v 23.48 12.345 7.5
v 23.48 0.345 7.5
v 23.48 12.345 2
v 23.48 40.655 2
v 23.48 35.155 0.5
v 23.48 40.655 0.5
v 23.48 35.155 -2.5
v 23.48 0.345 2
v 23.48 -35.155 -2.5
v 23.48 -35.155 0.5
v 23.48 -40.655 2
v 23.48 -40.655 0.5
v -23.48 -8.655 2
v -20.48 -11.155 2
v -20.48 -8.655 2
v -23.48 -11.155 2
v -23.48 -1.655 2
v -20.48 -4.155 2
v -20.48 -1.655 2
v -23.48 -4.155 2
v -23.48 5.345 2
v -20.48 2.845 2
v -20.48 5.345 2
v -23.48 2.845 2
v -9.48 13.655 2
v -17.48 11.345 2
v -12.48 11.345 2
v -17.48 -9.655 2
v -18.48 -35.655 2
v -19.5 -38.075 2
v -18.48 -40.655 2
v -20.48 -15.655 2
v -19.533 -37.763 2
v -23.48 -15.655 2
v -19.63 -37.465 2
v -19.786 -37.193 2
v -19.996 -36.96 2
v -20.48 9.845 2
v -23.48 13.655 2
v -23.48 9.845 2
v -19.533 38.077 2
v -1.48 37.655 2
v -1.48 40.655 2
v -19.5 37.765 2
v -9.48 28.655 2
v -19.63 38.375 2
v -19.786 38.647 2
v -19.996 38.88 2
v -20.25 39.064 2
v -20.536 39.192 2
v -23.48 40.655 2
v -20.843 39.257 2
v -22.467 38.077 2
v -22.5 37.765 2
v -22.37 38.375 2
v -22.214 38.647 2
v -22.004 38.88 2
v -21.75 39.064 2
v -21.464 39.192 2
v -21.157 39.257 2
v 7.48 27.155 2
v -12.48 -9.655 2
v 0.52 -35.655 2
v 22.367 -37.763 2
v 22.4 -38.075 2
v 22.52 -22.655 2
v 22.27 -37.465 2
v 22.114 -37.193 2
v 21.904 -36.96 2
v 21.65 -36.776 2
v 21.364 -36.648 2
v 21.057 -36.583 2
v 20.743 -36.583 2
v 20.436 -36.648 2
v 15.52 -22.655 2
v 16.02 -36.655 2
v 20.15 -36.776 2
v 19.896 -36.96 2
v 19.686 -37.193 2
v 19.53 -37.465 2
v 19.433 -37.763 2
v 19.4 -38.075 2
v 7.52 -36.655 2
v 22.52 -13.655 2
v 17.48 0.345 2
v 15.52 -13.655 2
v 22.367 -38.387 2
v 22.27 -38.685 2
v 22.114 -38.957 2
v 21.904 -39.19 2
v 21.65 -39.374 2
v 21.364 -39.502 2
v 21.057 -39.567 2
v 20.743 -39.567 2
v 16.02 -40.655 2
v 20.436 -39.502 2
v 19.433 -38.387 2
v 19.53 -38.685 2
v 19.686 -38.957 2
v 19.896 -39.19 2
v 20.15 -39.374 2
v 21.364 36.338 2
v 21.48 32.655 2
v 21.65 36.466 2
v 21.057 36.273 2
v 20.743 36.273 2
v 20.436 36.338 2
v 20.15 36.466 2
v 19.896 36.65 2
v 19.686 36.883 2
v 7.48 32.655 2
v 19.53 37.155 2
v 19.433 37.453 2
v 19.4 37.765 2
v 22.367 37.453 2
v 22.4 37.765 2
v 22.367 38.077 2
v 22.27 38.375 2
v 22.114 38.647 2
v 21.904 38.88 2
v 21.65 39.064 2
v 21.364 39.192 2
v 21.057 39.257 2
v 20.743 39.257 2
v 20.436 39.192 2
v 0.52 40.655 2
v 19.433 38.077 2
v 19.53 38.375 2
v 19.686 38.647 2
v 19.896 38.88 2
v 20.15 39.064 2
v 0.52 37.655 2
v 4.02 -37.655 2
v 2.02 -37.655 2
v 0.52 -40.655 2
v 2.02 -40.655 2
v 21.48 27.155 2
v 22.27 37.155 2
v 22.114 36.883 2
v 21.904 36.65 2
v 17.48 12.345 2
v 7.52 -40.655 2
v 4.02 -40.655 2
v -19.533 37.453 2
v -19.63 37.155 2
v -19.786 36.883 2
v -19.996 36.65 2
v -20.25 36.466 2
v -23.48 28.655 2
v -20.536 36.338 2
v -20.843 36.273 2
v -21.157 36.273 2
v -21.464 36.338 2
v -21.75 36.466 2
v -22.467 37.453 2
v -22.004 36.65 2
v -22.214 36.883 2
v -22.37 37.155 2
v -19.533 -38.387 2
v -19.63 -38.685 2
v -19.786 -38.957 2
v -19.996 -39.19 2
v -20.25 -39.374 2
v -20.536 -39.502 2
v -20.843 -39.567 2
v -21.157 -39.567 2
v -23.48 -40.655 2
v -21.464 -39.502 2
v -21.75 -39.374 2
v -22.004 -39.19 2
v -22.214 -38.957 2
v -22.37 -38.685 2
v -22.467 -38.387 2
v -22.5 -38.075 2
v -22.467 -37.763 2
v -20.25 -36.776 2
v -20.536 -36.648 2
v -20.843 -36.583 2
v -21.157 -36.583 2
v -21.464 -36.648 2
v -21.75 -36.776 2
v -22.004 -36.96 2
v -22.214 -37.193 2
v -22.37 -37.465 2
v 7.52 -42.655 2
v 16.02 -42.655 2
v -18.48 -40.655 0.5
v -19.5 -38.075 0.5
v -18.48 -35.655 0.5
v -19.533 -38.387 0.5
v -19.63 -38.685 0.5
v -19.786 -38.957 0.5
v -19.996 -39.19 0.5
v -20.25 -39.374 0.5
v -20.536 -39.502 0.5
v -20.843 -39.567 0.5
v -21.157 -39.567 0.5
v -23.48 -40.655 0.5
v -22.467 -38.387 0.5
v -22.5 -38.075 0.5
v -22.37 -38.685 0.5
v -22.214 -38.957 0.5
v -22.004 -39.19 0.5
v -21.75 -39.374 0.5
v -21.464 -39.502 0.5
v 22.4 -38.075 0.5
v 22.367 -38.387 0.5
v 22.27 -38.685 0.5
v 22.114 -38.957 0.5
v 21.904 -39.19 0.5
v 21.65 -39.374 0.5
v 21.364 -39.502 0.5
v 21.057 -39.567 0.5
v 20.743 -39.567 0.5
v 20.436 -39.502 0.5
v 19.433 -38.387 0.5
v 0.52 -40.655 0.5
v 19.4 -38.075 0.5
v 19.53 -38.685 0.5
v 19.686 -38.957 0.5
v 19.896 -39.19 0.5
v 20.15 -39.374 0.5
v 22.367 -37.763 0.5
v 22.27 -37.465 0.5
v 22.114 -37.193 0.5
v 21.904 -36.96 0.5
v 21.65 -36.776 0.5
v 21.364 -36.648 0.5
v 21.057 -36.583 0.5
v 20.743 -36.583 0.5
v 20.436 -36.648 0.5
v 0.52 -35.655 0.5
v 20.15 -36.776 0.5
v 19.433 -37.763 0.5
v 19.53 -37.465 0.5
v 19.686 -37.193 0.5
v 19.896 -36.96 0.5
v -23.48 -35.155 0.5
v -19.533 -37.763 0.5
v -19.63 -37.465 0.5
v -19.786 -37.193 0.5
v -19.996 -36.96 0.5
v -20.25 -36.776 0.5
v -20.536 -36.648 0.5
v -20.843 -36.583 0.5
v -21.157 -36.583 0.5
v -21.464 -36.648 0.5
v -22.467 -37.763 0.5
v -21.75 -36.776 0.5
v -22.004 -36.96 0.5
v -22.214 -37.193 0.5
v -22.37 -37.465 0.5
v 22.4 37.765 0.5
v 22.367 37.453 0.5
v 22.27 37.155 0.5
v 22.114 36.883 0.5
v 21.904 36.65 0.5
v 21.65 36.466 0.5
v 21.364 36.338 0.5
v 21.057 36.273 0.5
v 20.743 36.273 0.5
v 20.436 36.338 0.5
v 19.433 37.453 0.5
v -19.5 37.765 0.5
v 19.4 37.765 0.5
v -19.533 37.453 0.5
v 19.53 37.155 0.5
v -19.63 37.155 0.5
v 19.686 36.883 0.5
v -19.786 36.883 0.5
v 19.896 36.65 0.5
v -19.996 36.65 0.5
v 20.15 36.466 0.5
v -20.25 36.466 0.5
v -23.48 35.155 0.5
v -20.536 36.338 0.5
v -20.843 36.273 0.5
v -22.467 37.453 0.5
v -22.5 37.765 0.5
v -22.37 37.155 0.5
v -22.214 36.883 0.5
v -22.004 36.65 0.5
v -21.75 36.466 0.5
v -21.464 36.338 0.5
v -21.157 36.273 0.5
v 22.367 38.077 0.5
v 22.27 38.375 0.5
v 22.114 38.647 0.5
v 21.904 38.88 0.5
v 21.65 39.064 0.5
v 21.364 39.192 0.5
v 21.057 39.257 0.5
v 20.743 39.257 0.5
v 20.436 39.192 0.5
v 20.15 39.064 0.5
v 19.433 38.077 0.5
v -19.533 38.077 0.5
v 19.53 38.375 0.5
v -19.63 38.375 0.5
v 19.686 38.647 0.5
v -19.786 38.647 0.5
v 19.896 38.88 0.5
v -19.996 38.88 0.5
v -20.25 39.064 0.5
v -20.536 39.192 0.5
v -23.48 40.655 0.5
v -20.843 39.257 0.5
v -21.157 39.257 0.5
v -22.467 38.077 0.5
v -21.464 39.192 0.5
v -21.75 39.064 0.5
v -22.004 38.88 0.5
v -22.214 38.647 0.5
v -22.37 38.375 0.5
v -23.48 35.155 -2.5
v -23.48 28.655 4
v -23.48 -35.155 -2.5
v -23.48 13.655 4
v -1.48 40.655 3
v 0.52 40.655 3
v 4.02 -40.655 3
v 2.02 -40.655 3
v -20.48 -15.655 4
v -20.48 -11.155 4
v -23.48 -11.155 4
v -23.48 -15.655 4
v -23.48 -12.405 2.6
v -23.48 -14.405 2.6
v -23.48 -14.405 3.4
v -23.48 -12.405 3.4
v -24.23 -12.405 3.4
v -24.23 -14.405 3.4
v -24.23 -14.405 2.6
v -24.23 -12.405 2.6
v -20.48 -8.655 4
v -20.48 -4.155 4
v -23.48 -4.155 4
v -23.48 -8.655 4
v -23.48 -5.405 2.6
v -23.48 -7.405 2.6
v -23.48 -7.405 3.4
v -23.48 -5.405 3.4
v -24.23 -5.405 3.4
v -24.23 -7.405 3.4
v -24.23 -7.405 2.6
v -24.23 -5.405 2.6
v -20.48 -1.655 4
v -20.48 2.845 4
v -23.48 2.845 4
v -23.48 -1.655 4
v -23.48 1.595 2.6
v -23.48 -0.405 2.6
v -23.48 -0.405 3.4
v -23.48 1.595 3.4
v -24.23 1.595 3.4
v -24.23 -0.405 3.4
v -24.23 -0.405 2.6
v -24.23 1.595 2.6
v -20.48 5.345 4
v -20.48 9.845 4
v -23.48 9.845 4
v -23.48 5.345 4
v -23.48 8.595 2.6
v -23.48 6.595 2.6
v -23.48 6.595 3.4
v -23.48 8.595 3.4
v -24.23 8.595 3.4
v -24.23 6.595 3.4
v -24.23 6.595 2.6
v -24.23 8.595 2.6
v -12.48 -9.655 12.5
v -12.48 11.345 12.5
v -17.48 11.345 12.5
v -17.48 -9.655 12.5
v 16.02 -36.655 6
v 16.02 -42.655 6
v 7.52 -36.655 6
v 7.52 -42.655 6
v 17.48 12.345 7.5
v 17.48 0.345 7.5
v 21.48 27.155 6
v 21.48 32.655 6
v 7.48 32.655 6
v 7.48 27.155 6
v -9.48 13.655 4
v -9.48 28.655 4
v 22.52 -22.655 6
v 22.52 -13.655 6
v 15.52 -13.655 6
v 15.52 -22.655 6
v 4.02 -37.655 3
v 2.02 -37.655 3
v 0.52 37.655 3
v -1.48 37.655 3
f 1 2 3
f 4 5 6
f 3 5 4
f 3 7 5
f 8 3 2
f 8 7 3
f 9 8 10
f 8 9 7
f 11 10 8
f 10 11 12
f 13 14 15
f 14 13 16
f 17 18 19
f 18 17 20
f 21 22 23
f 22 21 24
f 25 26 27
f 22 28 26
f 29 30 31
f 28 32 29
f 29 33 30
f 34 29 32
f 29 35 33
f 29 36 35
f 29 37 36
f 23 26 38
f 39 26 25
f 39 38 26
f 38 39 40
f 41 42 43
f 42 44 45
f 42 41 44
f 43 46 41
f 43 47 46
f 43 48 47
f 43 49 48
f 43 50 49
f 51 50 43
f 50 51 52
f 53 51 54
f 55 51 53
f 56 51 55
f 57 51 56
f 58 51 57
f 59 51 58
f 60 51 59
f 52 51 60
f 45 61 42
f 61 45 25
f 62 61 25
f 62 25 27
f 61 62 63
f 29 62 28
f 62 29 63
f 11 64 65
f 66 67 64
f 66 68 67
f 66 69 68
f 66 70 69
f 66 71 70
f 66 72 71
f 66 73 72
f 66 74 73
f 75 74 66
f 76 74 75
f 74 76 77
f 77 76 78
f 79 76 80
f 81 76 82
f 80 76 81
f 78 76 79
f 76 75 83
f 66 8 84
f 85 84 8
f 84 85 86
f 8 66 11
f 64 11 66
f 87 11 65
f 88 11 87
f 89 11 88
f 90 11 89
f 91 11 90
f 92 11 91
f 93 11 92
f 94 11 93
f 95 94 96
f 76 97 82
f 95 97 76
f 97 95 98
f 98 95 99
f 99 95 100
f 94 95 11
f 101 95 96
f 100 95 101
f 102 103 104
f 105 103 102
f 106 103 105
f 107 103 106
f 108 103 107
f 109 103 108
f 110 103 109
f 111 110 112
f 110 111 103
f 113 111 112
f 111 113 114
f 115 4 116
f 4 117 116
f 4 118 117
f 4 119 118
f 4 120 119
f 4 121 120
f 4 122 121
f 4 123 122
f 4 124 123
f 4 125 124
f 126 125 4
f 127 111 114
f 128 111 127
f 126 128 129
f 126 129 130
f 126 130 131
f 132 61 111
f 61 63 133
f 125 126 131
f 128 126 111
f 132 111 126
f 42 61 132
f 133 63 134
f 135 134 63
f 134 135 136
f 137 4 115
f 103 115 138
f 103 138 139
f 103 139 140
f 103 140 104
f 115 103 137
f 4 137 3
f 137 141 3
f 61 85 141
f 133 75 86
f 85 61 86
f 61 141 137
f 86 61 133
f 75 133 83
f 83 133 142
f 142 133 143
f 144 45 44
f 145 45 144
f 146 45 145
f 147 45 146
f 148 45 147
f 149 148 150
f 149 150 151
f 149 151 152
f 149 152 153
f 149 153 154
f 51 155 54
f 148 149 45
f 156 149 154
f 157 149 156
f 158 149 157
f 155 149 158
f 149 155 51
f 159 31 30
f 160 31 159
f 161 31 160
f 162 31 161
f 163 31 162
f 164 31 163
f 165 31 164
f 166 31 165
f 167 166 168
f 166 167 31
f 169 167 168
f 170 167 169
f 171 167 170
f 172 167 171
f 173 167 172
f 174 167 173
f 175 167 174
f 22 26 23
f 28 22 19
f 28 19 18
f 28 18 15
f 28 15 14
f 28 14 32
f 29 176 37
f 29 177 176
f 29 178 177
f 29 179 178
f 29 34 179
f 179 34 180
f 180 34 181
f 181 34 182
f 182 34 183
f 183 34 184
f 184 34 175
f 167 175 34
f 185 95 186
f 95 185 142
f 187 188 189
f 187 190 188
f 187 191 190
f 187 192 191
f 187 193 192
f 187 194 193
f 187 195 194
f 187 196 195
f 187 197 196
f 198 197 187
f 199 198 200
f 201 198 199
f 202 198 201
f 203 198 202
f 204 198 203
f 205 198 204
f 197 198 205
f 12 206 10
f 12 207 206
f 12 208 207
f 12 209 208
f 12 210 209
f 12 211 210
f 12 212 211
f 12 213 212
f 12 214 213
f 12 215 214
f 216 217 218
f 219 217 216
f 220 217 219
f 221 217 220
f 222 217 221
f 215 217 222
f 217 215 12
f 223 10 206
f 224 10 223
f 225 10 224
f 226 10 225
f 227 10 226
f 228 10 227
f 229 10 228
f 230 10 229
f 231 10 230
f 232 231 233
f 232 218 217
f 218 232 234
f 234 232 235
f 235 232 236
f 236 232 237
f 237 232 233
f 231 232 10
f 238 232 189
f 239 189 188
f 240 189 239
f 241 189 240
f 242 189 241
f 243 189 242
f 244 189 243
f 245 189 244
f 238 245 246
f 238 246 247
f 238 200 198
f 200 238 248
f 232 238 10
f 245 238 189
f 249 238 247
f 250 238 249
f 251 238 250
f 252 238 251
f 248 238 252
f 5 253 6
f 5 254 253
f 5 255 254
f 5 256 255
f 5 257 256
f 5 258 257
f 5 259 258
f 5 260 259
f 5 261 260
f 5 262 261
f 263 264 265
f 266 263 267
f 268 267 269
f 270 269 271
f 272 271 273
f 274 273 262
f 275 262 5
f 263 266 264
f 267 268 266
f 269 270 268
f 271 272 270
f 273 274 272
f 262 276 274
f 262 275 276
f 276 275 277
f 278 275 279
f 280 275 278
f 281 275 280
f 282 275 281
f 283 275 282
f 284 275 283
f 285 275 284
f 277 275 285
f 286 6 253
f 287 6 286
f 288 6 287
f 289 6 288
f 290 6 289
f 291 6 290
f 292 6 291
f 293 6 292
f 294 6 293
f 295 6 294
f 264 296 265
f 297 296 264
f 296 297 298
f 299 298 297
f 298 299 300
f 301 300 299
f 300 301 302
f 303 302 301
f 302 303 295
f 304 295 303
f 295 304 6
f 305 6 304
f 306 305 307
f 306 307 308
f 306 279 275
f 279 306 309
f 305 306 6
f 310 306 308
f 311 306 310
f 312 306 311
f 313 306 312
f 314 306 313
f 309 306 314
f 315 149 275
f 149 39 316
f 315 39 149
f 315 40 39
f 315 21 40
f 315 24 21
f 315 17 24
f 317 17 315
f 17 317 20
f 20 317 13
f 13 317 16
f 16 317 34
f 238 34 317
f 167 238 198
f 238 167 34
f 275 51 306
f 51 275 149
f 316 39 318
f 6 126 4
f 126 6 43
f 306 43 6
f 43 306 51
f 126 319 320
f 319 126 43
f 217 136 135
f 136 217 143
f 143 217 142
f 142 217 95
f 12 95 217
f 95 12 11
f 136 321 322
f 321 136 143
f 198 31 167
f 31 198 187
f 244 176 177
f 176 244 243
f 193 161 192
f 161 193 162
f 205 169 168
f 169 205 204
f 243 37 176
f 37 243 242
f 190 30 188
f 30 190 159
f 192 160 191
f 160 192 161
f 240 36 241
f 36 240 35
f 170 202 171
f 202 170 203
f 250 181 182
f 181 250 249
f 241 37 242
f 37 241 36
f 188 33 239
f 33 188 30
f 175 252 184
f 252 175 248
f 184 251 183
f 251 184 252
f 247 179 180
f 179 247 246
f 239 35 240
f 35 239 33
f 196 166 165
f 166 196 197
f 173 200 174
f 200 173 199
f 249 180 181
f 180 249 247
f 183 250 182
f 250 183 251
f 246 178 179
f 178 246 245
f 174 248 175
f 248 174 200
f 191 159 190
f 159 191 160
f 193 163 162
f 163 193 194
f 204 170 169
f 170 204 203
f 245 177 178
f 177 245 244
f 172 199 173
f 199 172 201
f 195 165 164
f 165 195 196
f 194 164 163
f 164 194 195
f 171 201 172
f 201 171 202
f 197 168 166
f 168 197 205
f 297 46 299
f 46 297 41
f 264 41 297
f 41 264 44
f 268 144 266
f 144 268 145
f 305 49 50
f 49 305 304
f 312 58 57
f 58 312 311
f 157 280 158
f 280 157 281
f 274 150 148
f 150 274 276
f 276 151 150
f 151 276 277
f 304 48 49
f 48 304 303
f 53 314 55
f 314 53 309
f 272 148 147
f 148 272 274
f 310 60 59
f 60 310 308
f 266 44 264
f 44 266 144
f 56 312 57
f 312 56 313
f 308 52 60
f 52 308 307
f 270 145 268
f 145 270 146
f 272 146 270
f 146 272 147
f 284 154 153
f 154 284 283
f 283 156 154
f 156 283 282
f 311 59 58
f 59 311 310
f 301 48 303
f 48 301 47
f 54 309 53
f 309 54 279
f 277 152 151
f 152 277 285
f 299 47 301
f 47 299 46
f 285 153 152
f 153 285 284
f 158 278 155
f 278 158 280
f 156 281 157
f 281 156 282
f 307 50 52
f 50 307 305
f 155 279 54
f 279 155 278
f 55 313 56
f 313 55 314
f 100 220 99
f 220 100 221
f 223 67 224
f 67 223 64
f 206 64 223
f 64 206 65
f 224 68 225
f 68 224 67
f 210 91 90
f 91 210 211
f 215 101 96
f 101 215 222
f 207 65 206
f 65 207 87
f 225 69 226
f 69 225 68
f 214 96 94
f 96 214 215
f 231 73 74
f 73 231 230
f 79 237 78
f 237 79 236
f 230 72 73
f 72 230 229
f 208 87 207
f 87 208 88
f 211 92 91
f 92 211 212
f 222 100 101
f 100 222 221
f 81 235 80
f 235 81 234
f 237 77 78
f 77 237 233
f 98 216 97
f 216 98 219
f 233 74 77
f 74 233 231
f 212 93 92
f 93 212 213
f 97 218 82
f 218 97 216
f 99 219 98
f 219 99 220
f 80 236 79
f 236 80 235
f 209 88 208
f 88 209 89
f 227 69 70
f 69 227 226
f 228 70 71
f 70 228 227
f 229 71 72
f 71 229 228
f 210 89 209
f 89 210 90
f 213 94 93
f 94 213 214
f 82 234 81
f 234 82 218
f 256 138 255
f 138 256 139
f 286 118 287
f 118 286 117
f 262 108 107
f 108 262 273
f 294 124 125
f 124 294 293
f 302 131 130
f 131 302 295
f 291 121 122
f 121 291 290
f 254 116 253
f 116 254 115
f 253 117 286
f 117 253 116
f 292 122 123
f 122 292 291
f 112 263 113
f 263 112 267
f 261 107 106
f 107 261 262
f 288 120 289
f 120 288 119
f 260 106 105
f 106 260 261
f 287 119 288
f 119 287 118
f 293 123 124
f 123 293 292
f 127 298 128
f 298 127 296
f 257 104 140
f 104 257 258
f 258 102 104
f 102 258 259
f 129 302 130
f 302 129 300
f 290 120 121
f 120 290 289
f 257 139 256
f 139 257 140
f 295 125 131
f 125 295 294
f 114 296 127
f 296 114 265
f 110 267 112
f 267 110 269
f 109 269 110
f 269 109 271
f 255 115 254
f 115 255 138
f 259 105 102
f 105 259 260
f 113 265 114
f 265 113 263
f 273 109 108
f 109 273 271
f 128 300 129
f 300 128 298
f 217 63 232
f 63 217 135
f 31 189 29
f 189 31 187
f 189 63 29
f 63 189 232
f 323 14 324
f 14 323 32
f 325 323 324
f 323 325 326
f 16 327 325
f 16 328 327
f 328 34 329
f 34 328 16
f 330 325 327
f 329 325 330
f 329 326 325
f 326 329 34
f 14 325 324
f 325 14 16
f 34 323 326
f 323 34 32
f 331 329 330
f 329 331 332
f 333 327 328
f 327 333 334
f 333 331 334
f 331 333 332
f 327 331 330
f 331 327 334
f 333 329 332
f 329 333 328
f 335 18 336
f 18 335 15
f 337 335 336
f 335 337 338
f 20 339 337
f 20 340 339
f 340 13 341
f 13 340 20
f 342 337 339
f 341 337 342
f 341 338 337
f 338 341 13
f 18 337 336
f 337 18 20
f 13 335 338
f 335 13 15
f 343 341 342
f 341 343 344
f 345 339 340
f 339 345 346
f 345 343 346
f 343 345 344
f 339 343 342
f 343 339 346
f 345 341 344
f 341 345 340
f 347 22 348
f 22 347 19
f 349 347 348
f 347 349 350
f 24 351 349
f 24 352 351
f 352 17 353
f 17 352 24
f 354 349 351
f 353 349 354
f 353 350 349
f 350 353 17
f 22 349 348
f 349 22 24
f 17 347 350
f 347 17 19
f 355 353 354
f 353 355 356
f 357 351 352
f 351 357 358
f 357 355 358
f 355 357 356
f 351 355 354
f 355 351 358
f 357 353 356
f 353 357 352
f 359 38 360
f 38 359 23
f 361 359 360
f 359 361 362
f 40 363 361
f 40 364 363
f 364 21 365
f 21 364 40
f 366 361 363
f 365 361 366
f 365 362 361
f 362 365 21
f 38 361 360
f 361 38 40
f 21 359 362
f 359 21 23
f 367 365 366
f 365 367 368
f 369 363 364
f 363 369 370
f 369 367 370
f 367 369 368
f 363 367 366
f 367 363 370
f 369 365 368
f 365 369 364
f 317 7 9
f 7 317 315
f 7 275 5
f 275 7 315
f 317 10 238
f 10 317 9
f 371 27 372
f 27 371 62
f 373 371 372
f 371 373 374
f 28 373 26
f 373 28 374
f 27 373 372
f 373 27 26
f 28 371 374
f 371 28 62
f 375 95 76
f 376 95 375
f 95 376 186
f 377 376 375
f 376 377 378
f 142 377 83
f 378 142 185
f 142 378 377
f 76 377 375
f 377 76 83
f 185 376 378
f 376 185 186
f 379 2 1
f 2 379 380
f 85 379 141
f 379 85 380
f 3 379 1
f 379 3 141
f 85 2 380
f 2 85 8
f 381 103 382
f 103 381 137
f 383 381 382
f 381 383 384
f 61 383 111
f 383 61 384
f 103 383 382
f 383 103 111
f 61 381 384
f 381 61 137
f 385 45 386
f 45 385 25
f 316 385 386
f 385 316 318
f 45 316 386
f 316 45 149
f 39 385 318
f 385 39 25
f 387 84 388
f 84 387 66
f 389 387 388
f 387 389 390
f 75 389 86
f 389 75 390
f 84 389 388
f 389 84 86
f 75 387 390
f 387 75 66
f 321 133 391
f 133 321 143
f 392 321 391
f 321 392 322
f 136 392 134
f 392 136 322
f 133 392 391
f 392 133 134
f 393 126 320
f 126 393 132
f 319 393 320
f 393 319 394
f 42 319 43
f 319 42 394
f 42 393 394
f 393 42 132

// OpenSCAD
// All dimensions mm

// NOTE: These locations and sizes have not been verified!

board_w=46.96;
board_h=81.31;
board_d=8;
board_pcb_d=1.5;

m_hole_d = 3.00;
m_hole_r_x = 2.58;  // From right edge of board
m_hole_x = 2.48; // From left edge of board
m_hole_t_y = 2.89; // From top edge of board
m_hole_y = 2.58; // From botttom edge of board

epaper_standoff=3.00; // Height above board of e-paper
epaper_w=board_w;
epaper_h=board_h-5.5 // Top edge
     -5.5; // Bottom edge

// ePaper cable notch
notch_w=19;
notch_h=5;
notch_x=5;

// .1" expansion connector
point_one_x=6;
point_one_y=31;
point_one_h=21;
point_one_w=5;
point_one_d=10.5;

// Microusb
usb_x=31;
usb_y=-2.0;
usb_h=6.0;
usb_w=8.5;
usb_d=4;

// Grove expansion connector
grove_w=6;
grove_h=12;
grove_d=5.5;
grove_x=board_w-grove_w;
grove_y=41;

// WiFi and BT antenna
antenna_w=14;
antenna_h=5.5;
antenna_d=4;
antenna_y=board_h-8-antenna_h;
antenna_x=board_w-antenna_w-2;

// SD/TF Card slot
sd_card_w=14;
sd_card_h=15;
sd_card_d=2;
sd_card_x=0;
sd_card_y=board_h-12-sd_card_h;

// Battery connector
bat_w=7;
bat_h=9;
bat_d=4;
bat_x=39;
bat_y=18;

// MEMS microphones
mic_w=2;
mic_h=3;
mic_d=1;

mic_1_x=25.5;
mic_1_y=0;

mic_2_x=22;
mic_2_y=board_h-mic_h;

union() {
     case();
     !translate([0,0,2]) {
	  ttgo_t5s();
     }
};

module case() {
     difference() {
	  cube([80,90,8], center=true); // case external
	  translate([0,0,3]) {
	       // epaper window
	       cube([epaper_w+0.4,epaper_h+0.4,3], center=true);
	  }
	  translate([0,0,-1.5]) {
	       cube([board_w+2,board_h+2,6], center=true);
	  }
     }
}

// loc = offset of bottom left of component corner of board
// dim = dimensions of component
// flip = use non-component side of board
module component(loc,dim, flip=false) {
     if(flip) {
	  mirror([0,0,1])
	       translate([-board_w/2+loc.x,-board_h/2+loc.y,+board_pcb_d/2+loc.z]) {
	       cube(dim);
	  }
     } else {
	  translate([-board_w/2+loc.x,-board_h/2+loc.y,+board_pcb_d/2+loc.z]) {
	       cube(dim);
	  }
     }
}

module switch(loc) {
     translate([-board_w/2+loc.x,-board_h/2+loc.y,+board_pcb_d/2+loc.z]) {
	  union() {
	       cube([3,4.5,2.0]); // Body
	       translate([-1.5/2,1.25,0.6]) {
		    cube([1.5,2.0,0.8]);
	       }
	  }
     }
}

module ttgo_t5s() {
     // Main board. Reference point is mid plane of PCB
     // Board orientation: Component side up, e-paper tab at bottom
     union() {
	  translate([0,0,-board_pcb_d/2]) {
	       //PCB
	       difference() {
		    cube([board_w, board_h, board_pcb_d], center=true);
		    // Mounting hole bottom left
		    translate([-board_w/2+m_hole_x,-board_h/2+m_hole_y,0]) {
			 cylinder(board_pcb_d+0.2, d=m_hole_d, center=true, $fn=30);
		    }
		    // Mounting hole bottom right
		    translate([-board_w/2+m_hole_x,board_h/2-m_hole_t_y,0]) {
			 cylinder(board_pcb_d+0.2, d=m_hole_d, center=true, $fn=30);
		    }
		    // Mounting hole top left
		    translate([board_w/2-m_hole_r_x,-board_h/2+m_hole_y,0]) {
			 cylinder(board_pcb_d+0.2, d=m_hole_d, center=true, $fn=30);
		    }
		    // Mounting hole top right
		    translate([board_w/2-m_hole_r_x,board_h/2-m_hole_t_y,0]) {
			 cylinder(board_pcb_d+0.2, d=m_hole_d, center=true, $fn=30);
		    }
		    // Notch
		    component([notch_x,0,0-board_pcb_d],[ notch_w,notch_h,board_pcb_d+0.4]);
	       }
	       component([0,5.5,0],[epaper_w,epaper_h, epaper_standoff], flip=true);
	       component([point_one_x, point_one_y, 0],[point_one_w, point_one_h, point_one_d]);
	       component([usb_x, usb_y, 0],[usb_w, usb_h, usb_d]);
	       component([grove_x, grove_y, 0], [grove_w, grove_h, grove_d]);
	       component([antenna_x, antenna_y, 0], [antenna_w, antenna_h, antenna_d]);
	       component([sd_card_x, sd_card_y, 0], [sd_card_w, sd_card_h, sd_card_d]);
	       component([bat_x, bat_y, 0], [bat_w, bat_h, bat_d]);
	       component([mic_1_x, mic_1_y, 0], [mic_w, mic_h, mic_d]);
	       component([mic_2_x, mic_2_y, 0], [mic_w, mic_h, mic_d]);

	       switch([0,25,0]);
	       switch([0,32,0]);
	       switch([0,39,0]);
	       switch([0,46,0]);

	  }
     }
}
